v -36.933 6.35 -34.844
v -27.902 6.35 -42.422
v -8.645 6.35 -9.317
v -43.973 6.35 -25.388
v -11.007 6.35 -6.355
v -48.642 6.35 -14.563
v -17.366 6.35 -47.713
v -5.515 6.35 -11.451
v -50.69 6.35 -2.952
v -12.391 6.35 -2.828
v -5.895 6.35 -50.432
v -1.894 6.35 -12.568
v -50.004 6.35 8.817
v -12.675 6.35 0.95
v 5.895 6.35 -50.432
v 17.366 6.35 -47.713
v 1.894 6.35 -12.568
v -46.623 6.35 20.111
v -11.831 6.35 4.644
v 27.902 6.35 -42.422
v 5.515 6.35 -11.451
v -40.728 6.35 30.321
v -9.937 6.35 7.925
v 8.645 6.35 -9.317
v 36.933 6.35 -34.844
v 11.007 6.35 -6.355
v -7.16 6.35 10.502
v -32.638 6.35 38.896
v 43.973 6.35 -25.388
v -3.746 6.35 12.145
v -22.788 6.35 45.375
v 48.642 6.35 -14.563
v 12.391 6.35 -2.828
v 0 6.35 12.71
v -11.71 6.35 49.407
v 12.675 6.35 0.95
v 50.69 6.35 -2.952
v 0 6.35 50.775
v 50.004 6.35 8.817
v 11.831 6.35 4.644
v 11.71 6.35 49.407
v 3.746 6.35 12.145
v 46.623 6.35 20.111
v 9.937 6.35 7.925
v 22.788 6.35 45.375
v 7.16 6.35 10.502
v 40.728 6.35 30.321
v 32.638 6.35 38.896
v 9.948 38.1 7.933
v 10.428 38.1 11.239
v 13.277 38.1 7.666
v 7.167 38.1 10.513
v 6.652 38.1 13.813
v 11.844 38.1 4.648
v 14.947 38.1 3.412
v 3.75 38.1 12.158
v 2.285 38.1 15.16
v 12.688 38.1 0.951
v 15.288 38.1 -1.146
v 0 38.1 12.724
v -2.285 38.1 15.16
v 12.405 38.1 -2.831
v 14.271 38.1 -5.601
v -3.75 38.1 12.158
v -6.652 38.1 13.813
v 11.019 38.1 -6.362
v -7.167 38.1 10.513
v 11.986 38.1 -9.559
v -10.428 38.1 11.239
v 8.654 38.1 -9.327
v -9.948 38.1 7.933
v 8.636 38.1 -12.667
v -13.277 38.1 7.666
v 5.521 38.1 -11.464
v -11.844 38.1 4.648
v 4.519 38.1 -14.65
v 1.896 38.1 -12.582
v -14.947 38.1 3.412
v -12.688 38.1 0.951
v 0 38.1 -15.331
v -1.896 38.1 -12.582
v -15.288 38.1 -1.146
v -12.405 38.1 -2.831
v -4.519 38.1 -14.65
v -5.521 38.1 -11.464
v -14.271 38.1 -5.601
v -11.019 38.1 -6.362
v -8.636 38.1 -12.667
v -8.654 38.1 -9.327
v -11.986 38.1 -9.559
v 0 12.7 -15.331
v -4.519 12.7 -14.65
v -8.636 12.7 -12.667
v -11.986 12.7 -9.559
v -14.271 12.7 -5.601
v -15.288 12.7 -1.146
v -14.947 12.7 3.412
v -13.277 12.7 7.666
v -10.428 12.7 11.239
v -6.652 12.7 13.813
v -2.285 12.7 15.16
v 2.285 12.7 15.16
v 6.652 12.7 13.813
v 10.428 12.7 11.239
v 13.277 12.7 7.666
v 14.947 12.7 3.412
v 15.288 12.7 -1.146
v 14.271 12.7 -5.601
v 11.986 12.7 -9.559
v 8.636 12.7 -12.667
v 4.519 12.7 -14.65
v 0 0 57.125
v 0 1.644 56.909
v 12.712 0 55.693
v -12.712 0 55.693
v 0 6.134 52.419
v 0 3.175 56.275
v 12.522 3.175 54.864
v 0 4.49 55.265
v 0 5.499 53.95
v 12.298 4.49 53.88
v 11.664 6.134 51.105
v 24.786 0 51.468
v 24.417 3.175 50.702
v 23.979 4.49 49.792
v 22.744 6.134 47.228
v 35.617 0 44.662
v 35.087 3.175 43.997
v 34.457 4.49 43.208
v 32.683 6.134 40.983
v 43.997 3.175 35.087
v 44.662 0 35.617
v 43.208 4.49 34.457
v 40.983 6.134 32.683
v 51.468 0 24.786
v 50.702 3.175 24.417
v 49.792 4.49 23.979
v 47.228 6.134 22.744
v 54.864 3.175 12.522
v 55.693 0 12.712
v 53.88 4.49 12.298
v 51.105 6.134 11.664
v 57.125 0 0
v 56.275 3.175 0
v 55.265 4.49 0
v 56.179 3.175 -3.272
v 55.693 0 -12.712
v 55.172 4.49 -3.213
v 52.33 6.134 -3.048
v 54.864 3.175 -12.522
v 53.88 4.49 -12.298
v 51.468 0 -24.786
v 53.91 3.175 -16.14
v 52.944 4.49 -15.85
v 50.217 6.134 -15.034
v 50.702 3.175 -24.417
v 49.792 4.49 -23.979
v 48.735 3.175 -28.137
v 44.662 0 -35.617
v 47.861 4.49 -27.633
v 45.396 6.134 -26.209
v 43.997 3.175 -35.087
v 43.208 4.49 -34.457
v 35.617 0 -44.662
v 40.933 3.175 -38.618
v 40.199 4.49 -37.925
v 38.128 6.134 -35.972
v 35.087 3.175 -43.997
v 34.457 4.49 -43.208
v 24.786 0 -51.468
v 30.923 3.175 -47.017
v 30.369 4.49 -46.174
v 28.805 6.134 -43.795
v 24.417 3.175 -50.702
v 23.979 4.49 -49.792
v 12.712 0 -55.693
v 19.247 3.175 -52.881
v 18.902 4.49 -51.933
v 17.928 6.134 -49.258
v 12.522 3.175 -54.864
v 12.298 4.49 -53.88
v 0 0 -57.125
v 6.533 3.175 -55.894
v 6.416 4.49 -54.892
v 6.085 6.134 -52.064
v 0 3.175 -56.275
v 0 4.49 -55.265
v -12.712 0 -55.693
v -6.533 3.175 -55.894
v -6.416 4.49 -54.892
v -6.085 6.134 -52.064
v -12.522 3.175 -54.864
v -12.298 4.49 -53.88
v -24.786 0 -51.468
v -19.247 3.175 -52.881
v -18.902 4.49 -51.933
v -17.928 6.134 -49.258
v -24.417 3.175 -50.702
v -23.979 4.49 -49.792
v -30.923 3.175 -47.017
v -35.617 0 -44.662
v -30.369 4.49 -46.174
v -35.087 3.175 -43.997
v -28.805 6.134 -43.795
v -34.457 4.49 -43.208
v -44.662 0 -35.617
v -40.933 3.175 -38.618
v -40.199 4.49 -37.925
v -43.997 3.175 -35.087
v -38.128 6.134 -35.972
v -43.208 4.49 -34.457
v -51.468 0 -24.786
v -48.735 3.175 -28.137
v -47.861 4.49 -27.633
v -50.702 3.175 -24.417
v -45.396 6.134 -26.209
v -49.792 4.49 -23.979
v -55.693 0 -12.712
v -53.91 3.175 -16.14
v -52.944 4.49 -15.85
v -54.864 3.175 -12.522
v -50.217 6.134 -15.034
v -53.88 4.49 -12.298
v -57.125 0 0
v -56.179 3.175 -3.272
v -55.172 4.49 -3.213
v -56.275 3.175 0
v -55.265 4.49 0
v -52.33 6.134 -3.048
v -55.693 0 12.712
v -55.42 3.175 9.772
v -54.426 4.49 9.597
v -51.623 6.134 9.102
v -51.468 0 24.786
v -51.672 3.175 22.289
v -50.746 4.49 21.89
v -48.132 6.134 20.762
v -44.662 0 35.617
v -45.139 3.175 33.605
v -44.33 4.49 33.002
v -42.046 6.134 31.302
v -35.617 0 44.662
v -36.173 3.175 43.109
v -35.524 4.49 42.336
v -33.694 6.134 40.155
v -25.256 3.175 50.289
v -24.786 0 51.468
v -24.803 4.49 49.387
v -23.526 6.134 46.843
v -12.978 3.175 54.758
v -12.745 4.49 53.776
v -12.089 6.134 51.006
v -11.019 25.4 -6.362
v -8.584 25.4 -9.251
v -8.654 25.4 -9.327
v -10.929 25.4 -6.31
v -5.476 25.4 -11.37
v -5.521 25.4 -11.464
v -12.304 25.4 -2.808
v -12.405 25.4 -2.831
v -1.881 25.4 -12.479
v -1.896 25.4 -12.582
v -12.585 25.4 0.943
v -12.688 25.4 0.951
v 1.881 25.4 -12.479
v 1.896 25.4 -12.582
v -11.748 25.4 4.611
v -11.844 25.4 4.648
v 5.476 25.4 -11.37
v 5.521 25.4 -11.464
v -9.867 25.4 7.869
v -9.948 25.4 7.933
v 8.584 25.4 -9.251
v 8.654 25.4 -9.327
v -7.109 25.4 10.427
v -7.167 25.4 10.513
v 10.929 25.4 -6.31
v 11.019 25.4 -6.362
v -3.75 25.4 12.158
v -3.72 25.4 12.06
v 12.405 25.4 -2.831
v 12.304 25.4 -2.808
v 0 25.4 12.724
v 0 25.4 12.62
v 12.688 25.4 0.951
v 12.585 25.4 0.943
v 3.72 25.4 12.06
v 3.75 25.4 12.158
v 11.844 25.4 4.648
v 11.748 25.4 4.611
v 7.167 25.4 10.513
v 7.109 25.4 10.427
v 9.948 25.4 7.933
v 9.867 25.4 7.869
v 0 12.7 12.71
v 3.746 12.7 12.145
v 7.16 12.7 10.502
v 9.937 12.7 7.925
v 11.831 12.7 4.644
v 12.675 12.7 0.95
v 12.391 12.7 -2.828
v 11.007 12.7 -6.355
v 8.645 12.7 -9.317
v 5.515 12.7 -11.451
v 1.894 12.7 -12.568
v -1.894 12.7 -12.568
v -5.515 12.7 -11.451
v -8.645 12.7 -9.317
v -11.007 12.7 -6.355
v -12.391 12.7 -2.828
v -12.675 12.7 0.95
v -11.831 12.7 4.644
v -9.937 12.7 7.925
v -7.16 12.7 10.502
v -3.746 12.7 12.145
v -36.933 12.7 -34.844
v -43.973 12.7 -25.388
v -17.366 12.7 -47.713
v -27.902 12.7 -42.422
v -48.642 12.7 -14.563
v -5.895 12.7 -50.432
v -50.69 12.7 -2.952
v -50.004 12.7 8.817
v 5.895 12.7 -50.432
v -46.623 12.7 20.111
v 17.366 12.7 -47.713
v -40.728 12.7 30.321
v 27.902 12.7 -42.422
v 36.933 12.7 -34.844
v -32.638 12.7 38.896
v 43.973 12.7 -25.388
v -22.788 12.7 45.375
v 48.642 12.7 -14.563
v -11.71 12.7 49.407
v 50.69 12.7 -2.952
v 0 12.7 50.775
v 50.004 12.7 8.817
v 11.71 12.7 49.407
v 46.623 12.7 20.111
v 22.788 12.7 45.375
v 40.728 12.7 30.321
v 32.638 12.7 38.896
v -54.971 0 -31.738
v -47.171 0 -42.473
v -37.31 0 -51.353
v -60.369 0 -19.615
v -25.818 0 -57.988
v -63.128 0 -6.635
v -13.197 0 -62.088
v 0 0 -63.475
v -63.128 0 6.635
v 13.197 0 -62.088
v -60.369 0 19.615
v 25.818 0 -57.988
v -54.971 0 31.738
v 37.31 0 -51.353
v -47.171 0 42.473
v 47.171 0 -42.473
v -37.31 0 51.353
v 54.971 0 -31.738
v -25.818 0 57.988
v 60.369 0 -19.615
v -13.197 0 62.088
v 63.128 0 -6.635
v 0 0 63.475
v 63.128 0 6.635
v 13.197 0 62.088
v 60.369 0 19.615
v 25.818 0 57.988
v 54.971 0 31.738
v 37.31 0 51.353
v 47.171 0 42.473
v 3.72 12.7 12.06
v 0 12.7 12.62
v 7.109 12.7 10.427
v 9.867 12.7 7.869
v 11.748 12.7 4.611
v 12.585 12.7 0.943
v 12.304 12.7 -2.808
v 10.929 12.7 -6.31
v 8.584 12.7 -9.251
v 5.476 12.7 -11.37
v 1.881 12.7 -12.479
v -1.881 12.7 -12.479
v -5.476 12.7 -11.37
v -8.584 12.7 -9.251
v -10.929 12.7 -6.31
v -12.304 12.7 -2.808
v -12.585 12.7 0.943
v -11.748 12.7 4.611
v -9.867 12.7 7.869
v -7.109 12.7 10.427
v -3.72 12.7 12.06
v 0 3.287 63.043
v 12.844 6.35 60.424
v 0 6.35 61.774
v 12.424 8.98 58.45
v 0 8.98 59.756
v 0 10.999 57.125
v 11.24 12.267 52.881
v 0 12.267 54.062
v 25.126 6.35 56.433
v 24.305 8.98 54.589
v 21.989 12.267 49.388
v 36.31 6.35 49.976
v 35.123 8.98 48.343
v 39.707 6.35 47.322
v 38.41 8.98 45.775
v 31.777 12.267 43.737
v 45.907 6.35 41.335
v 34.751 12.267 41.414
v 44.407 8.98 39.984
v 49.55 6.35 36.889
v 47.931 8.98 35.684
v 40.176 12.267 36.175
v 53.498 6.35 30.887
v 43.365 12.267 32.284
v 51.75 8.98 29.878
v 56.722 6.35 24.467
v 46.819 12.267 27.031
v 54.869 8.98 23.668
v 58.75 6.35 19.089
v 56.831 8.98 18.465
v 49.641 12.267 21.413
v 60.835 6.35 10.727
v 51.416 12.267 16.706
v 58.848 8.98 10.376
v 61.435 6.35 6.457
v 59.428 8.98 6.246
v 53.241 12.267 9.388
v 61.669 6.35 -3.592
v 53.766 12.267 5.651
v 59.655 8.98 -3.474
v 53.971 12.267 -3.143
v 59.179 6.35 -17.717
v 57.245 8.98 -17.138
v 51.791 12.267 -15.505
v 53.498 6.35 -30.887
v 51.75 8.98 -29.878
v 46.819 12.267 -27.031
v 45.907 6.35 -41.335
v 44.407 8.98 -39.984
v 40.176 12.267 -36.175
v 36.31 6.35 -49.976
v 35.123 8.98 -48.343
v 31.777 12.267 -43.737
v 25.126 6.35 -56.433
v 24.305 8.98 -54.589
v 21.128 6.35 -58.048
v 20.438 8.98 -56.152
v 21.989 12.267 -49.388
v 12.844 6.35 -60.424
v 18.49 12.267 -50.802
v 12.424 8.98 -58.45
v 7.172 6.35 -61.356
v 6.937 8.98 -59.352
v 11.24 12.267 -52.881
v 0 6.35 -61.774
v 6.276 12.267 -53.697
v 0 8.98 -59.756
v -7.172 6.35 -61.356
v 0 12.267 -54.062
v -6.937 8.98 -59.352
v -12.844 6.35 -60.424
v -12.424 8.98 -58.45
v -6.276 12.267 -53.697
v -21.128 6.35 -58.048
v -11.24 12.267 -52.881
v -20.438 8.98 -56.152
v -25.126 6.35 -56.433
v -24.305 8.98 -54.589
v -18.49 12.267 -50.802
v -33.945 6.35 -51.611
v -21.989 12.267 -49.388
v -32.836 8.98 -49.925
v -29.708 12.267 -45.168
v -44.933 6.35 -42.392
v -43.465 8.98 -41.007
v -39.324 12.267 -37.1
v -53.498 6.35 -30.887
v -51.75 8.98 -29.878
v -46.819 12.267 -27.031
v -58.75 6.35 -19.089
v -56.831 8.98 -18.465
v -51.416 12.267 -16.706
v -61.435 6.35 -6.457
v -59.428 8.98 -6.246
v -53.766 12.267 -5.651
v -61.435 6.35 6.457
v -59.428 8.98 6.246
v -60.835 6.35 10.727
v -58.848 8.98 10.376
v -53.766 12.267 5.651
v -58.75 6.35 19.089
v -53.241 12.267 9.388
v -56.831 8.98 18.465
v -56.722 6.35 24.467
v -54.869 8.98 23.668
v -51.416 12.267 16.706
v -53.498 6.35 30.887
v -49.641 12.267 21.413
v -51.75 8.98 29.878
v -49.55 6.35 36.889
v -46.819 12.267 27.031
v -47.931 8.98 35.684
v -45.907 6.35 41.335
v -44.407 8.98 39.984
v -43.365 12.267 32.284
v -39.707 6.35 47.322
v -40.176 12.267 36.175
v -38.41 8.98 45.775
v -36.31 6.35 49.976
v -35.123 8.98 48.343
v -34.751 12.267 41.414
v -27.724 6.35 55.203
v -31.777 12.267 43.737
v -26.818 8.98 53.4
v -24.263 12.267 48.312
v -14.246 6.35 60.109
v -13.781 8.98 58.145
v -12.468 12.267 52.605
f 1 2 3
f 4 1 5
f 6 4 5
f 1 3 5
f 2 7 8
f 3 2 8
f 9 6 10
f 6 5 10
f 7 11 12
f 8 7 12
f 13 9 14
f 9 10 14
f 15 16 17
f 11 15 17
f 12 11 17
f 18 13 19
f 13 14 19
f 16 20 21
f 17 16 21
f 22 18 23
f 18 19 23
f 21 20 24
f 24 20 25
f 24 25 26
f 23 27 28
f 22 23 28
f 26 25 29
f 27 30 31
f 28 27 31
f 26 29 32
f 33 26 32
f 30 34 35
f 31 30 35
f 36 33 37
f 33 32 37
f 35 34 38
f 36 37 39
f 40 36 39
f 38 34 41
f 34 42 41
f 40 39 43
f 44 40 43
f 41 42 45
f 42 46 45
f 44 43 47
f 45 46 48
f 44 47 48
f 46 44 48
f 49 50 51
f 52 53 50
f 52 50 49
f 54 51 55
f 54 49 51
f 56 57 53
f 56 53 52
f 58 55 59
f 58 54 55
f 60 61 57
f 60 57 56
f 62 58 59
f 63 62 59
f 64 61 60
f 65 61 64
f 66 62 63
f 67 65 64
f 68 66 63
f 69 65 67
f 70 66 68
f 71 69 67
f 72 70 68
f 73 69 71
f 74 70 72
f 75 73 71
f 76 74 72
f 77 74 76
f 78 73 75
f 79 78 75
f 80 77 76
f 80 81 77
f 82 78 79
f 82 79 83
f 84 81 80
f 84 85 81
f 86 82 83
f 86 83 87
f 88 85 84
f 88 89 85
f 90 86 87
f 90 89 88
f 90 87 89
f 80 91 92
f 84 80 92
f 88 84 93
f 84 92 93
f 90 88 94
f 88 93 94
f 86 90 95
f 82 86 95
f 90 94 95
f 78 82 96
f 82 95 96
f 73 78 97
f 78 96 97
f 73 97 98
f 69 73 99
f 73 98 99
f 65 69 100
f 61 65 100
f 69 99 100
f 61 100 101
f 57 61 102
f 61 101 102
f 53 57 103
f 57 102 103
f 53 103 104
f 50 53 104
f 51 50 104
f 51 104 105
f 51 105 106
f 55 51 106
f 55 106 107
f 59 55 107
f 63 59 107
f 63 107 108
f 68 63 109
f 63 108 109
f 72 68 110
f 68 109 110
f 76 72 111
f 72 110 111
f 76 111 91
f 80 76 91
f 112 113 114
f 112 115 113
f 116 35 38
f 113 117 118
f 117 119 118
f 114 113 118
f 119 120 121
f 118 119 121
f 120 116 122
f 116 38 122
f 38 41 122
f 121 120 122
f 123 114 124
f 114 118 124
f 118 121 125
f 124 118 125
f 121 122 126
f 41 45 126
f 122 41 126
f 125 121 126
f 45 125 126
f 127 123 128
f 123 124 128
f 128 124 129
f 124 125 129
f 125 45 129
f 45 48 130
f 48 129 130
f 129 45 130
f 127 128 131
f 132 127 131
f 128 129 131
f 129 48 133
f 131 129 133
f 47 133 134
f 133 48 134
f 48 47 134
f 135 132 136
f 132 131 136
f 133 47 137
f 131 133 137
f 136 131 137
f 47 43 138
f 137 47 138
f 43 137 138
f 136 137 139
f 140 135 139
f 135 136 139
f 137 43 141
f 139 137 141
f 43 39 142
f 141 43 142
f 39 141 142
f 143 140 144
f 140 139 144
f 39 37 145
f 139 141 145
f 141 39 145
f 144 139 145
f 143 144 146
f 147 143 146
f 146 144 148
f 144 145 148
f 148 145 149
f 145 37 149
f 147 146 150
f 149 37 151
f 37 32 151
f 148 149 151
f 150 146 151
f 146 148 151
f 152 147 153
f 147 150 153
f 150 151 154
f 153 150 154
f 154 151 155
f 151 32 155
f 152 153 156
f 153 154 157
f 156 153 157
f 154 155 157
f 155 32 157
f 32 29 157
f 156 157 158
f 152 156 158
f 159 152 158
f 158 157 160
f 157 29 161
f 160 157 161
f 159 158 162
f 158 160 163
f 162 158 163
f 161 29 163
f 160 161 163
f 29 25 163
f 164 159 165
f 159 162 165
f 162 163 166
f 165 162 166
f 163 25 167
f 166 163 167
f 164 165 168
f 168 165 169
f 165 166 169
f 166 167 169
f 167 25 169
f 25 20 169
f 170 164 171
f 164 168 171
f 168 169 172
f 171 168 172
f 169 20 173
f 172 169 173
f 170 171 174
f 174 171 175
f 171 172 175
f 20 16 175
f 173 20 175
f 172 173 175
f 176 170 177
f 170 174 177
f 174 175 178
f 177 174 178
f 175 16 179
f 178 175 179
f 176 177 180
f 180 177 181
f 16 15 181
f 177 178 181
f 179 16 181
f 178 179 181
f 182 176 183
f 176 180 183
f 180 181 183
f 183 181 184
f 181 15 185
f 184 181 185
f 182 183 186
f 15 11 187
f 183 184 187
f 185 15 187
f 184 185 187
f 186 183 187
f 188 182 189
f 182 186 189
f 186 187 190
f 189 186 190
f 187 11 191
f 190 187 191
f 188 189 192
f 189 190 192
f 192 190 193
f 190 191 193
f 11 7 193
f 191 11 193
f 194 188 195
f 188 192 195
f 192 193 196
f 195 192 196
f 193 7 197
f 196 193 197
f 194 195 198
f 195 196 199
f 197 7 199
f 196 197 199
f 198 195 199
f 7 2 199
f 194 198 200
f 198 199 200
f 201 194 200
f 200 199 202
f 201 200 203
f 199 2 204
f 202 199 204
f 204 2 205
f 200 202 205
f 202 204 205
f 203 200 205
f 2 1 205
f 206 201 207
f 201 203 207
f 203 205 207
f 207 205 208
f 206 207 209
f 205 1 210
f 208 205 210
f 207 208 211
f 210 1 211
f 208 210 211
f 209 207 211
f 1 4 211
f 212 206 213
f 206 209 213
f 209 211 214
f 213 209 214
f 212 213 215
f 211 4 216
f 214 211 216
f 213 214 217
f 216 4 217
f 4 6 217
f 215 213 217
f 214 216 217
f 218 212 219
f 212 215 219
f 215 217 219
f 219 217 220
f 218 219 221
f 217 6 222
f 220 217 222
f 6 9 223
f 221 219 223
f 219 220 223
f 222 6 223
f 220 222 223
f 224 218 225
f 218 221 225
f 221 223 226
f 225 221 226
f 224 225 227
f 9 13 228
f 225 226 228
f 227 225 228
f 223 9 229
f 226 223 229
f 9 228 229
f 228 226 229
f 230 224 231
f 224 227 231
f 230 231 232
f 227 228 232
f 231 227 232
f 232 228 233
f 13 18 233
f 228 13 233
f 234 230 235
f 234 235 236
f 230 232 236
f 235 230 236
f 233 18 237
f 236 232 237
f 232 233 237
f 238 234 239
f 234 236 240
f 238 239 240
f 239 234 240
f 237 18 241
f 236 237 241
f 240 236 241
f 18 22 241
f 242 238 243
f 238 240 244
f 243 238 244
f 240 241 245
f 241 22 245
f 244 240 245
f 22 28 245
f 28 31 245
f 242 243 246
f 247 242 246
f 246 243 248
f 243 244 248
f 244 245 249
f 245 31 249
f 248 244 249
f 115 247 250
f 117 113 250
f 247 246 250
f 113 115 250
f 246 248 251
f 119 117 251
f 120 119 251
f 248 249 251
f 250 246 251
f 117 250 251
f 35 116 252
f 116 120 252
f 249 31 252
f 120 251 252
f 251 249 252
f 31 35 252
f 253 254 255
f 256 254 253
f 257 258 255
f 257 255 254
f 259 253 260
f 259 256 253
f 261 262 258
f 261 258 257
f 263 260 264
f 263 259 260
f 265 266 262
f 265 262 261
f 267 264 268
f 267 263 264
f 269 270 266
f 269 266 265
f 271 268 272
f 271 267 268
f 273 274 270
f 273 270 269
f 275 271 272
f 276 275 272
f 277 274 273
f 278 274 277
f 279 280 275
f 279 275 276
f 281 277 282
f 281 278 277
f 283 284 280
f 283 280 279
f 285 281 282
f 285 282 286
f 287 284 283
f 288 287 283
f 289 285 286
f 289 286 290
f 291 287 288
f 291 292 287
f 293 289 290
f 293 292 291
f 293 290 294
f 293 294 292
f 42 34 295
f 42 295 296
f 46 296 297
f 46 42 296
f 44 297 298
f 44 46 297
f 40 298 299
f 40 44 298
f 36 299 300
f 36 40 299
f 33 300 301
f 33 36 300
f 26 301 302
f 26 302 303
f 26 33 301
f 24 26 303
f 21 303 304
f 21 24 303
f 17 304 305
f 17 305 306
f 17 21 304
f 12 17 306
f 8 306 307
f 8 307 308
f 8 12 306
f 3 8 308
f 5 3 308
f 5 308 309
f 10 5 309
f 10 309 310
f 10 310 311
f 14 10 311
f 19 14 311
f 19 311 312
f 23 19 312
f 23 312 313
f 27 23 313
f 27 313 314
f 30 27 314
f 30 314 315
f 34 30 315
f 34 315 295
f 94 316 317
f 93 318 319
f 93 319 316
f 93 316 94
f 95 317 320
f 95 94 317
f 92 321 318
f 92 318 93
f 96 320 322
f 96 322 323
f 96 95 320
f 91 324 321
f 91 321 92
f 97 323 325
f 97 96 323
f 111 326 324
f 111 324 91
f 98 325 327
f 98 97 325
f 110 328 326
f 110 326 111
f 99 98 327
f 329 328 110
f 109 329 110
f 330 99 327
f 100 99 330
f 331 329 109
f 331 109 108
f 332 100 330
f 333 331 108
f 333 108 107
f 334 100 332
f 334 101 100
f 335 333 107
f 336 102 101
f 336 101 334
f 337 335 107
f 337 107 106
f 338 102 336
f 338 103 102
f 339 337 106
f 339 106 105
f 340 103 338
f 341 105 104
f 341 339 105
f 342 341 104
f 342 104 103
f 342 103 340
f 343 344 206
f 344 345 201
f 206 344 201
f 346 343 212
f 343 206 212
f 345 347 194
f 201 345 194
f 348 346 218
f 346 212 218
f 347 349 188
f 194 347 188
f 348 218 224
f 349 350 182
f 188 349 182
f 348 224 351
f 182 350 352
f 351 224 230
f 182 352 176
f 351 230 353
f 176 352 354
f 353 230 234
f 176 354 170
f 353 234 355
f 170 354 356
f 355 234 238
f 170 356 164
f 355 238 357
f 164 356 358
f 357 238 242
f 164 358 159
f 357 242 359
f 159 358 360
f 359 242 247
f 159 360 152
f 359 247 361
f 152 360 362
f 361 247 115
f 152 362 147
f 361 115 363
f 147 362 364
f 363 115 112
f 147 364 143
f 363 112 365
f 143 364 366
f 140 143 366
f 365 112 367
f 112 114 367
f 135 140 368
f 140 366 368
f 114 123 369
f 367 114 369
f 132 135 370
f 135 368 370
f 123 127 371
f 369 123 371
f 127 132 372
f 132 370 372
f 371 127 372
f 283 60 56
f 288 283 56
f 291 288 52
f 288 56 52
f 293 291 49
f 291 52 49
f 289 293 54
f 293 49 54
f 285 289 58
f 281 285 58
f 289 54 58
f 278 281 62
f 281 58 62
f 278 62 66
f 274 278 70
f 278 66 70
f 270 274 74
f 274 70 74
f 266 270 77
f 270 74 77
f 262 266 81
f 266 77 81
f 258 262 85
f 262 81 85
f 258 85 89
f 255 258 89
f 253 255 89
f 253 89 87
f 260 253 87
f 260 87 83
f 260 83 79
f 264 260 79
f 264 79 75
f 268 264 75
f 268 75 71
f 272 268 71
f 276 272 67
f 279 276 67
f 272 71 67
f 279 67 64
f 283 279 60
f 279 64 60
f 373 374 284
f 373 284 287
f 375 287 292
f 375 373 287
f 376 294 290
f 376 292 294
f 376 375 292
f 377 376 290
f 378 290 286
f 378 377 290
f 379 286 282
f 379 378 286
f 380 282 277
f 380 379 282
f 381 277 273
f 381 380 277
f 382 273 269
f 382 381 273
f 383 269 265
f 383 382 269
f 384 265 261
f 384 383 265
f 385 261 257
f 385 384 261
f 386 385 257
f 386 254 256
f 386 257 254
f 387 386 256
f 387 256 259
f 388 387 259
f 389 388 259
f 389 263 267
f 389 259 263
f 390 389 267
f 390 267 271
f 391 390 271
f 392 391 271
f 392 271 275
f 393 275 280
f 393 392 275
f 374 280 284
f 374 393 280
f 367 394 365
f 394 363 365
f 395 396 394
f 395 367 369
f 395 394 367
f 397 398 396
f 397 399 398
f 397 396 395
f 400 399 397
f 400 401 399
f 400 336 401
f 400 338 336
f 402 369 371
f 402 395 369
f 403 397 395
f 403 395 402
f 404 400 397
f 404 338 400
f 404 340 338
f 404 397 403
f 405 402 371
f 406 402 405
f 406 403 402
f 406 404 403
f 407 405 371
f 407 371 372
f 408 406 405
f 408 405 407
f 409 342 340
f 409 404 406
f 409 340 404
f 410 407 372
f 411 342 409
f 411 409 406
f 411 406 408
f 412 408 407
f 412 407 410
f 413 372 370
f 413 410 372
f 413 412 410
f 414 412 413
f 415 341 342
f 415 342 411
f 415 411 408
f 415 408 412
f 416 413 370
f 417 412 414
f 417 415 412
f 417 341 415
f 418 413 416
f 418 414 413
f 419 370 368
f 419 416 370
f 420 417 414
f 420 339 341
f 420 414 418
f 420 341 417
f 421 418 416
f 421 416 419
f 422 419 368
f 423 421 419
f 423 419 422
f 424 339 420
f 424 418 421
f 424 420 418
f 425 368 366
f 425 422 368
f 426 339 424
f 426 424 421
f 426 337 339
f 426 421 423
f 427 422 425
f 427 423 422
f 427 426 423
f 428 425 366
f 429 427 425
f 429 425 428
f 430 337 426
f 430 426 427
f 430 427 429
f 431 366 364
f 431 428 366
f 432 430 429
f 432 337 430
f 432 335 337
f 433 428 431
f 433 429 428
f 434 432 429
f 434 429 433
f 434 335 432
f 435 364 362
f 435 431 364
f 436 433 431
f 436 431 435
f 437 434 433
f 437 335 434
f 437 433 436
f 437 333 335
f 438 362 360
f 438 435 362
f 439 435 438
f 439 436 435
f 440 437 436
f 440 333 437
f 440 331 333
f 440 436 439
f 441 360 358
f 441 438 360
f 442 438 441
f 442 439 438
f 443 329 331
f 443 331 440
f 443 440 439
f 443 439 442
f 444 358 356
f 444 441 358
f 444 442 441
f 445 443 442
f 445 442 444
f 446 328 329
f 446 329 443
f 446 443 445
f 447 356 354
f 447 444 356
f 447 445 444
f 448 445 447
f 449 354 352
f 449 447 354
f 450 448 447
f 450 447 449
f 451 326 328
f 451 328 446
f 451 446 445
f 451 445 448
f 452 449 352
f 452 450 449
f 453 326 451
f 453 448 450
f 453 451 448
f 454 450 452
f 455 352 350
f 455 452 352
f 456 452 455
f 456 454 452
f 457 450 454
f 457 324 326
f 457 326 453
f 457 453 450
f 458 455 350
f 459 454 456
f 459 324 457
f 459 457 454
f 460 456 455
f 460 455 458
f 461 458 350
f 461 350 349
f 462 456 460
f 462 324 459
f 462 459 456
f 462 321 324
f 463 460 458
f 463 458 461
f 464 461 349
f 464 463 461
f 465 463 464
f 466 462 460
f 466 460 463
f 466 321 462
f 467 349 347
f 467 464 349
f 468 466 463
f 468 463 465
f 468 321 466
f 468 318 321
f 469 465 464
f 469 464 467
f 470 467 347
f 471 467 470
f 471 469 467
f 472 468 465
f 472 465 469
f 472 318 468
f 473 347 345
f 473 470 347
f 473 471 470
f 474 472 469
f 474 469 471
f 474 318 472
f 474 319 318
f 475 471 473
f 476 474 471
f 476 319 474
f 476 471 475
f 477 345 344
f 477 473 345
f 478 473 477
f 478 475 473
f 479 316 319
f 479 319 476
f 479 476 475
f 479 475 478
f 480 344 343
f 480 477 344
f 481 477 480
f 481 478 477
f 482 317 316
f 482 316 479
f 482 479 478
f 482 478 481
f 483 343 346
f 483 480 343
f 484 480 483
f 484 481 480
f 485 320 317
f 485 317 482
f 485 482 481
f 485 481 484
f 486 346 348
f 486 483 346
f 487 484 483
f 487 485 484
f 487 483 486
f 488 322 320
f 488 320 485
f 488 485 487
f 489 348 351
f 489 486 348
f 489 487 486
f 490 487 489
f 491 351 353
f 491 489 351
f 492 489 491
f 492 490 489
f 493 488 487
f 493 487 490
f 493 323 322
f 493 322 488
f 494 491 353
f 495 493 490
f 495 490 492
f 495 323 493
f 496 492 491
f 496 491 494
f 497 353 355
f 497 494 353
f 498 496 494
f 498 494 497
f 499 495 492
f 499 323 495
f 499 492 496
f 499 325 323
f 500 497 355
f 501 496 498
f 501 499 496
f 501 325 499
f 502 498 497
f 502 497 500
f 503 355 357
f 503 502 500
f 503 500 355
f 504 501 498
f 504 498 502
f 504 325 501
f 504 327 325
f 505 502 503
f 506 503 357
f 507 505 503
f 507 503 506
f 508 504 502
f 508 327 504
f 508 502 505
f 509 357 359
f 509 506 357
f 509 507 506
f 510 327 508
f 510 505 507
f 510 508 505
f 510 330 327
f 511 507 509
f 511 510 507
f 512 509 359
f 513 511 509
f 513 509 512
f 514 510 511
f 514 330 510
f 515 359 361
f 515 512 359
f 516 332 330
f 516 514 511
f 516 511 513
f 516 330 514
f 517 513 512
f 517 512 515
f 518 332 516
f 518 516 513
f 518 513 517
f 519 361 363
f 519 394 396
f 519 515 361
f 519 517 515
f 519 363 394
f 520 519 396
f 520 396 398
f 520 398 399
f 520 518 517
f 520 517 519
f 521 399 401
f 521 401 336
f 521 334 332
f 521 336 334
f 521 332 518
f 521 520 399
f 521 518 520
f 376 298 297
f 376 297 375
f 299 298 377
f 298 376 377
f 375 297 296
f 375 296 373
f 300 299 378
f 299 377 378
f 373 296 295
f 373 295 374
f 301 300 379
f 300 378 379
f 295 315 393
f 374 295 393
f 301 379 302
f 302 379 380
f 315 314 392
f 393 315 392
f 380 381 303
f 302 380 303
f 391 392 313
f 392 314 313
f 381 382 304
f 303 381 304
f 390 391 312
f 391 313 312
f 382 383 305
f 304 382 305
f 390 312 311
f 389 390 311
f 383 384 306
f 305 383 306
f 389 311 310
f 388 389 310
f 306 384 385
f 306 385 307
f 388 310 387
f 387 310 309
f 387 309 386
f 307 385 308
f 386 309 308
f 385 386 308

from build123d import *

# Parameters (mm, degrees)
SKETCH1_R           = 63.475313381
BOSS_EXTRUDE1_DEPTH = 12.7
FILLET2_R           = 12.7
SHELL2_T            = -6.35
SKETCH2_R           = 12.710048884
CUT_EXTRUDE1_DEPTH  = 12.7
SKETCH4_R           = 15.331222423
BOSS_EXTRUDE2_DEPTH = 25.4
SKETCH5_R           = 12.620209495
CUT_EXTRUDE2_DEPTH  = 27.94
SKETCH11_R          = 12.723642388
CUT_EXTRUDE4_DEPTH  = 12.7


with BuildPart() as part:
    # Sketch1 → Boss-Extrude1 (new body)
    with BuildSketch(Plane(origin=(0, 0, 0), x_dir=(1, 0, 0), z_dir=(0, 1, 0))):
        with Locations(Location((0, 0, 0), (0, 0, 270))):
            Circle(SKETCH1_R)
    extrude(amount=BOSS_EXTRUDE1_DEPTH)

    # Fillet2
    fillet2_edges = [part.edges().sort_by_distance(p)[0] for p in [
        (0, 12.7, -63.475313381),
    ]]
    fillet(fillet2_edges, radius=FILLET2_R - 0.0001)  # a hair under: the kernel refuses the full size

    # Shell2
    shell2_openings = [part.faces().sort_by_distance(p)[0] for p in [
        (0, 0, 0),
    ]]
    offset(amount=SHELL2_T, openings=shell2_openings)

    # Sketch2 → Cut-Extrude1 (cut)
    with BuildSketch(Plane(origin=(0, 0, 0), x_dir=(1, 0, 0), z_dir=(0, 1, 0))):
        with Locations(Location((0, 0, 0), (0, 0, 270))):
            Circle(SKETCH2_R)
    extrude(amount=CUT_EXTRUDE1_DEPTH, mode=Mode.SUBTRACT)

    # Sketch4 → Boss-Extrude2 (add)
    with BuildSketch(Plane(origin=(0, 12.7, 0), x_dir=(1, 0, 0), z_dir=(0, 1, 0))):
        with Locations(Location((0, 0, 0), (0, 0, 90))):
            Circle(SKETCH4_R)
    extrude(amount=BOSS_EXTRUDE2_DEPTH)

    # Sketch5 → Cut-Extrude2 (cut)
    with BuildSketch(Plane(origin=(0, 0, 0), x_dir=(1, 0, 0), z_dir=(0, 1, 0))):
        with Locations(Location((0, 0, 0), (0, 0, 270))):
            Circle(SKETCH5_R)
    extrude(amount=CUT_EXTRUDE2_DEPTH, mode=Mode.SUBTRACT)

    # Sketch11 → Cut-Extrude4 (cut)
    with BuildSketch(Plane(origin=(0, 38.1, 0), x_dir=(1, 0, 0), z_dir=(0, 1, 0))):
        with Locations(Location((0, 0, 0), (0, 0, 270))):
            Circle(SKETCH11_R)
    extrude(amount=-CUT_EXTRUDE4_DEPTH, mode=Mode.SUBTRACT)


solid = part.part
